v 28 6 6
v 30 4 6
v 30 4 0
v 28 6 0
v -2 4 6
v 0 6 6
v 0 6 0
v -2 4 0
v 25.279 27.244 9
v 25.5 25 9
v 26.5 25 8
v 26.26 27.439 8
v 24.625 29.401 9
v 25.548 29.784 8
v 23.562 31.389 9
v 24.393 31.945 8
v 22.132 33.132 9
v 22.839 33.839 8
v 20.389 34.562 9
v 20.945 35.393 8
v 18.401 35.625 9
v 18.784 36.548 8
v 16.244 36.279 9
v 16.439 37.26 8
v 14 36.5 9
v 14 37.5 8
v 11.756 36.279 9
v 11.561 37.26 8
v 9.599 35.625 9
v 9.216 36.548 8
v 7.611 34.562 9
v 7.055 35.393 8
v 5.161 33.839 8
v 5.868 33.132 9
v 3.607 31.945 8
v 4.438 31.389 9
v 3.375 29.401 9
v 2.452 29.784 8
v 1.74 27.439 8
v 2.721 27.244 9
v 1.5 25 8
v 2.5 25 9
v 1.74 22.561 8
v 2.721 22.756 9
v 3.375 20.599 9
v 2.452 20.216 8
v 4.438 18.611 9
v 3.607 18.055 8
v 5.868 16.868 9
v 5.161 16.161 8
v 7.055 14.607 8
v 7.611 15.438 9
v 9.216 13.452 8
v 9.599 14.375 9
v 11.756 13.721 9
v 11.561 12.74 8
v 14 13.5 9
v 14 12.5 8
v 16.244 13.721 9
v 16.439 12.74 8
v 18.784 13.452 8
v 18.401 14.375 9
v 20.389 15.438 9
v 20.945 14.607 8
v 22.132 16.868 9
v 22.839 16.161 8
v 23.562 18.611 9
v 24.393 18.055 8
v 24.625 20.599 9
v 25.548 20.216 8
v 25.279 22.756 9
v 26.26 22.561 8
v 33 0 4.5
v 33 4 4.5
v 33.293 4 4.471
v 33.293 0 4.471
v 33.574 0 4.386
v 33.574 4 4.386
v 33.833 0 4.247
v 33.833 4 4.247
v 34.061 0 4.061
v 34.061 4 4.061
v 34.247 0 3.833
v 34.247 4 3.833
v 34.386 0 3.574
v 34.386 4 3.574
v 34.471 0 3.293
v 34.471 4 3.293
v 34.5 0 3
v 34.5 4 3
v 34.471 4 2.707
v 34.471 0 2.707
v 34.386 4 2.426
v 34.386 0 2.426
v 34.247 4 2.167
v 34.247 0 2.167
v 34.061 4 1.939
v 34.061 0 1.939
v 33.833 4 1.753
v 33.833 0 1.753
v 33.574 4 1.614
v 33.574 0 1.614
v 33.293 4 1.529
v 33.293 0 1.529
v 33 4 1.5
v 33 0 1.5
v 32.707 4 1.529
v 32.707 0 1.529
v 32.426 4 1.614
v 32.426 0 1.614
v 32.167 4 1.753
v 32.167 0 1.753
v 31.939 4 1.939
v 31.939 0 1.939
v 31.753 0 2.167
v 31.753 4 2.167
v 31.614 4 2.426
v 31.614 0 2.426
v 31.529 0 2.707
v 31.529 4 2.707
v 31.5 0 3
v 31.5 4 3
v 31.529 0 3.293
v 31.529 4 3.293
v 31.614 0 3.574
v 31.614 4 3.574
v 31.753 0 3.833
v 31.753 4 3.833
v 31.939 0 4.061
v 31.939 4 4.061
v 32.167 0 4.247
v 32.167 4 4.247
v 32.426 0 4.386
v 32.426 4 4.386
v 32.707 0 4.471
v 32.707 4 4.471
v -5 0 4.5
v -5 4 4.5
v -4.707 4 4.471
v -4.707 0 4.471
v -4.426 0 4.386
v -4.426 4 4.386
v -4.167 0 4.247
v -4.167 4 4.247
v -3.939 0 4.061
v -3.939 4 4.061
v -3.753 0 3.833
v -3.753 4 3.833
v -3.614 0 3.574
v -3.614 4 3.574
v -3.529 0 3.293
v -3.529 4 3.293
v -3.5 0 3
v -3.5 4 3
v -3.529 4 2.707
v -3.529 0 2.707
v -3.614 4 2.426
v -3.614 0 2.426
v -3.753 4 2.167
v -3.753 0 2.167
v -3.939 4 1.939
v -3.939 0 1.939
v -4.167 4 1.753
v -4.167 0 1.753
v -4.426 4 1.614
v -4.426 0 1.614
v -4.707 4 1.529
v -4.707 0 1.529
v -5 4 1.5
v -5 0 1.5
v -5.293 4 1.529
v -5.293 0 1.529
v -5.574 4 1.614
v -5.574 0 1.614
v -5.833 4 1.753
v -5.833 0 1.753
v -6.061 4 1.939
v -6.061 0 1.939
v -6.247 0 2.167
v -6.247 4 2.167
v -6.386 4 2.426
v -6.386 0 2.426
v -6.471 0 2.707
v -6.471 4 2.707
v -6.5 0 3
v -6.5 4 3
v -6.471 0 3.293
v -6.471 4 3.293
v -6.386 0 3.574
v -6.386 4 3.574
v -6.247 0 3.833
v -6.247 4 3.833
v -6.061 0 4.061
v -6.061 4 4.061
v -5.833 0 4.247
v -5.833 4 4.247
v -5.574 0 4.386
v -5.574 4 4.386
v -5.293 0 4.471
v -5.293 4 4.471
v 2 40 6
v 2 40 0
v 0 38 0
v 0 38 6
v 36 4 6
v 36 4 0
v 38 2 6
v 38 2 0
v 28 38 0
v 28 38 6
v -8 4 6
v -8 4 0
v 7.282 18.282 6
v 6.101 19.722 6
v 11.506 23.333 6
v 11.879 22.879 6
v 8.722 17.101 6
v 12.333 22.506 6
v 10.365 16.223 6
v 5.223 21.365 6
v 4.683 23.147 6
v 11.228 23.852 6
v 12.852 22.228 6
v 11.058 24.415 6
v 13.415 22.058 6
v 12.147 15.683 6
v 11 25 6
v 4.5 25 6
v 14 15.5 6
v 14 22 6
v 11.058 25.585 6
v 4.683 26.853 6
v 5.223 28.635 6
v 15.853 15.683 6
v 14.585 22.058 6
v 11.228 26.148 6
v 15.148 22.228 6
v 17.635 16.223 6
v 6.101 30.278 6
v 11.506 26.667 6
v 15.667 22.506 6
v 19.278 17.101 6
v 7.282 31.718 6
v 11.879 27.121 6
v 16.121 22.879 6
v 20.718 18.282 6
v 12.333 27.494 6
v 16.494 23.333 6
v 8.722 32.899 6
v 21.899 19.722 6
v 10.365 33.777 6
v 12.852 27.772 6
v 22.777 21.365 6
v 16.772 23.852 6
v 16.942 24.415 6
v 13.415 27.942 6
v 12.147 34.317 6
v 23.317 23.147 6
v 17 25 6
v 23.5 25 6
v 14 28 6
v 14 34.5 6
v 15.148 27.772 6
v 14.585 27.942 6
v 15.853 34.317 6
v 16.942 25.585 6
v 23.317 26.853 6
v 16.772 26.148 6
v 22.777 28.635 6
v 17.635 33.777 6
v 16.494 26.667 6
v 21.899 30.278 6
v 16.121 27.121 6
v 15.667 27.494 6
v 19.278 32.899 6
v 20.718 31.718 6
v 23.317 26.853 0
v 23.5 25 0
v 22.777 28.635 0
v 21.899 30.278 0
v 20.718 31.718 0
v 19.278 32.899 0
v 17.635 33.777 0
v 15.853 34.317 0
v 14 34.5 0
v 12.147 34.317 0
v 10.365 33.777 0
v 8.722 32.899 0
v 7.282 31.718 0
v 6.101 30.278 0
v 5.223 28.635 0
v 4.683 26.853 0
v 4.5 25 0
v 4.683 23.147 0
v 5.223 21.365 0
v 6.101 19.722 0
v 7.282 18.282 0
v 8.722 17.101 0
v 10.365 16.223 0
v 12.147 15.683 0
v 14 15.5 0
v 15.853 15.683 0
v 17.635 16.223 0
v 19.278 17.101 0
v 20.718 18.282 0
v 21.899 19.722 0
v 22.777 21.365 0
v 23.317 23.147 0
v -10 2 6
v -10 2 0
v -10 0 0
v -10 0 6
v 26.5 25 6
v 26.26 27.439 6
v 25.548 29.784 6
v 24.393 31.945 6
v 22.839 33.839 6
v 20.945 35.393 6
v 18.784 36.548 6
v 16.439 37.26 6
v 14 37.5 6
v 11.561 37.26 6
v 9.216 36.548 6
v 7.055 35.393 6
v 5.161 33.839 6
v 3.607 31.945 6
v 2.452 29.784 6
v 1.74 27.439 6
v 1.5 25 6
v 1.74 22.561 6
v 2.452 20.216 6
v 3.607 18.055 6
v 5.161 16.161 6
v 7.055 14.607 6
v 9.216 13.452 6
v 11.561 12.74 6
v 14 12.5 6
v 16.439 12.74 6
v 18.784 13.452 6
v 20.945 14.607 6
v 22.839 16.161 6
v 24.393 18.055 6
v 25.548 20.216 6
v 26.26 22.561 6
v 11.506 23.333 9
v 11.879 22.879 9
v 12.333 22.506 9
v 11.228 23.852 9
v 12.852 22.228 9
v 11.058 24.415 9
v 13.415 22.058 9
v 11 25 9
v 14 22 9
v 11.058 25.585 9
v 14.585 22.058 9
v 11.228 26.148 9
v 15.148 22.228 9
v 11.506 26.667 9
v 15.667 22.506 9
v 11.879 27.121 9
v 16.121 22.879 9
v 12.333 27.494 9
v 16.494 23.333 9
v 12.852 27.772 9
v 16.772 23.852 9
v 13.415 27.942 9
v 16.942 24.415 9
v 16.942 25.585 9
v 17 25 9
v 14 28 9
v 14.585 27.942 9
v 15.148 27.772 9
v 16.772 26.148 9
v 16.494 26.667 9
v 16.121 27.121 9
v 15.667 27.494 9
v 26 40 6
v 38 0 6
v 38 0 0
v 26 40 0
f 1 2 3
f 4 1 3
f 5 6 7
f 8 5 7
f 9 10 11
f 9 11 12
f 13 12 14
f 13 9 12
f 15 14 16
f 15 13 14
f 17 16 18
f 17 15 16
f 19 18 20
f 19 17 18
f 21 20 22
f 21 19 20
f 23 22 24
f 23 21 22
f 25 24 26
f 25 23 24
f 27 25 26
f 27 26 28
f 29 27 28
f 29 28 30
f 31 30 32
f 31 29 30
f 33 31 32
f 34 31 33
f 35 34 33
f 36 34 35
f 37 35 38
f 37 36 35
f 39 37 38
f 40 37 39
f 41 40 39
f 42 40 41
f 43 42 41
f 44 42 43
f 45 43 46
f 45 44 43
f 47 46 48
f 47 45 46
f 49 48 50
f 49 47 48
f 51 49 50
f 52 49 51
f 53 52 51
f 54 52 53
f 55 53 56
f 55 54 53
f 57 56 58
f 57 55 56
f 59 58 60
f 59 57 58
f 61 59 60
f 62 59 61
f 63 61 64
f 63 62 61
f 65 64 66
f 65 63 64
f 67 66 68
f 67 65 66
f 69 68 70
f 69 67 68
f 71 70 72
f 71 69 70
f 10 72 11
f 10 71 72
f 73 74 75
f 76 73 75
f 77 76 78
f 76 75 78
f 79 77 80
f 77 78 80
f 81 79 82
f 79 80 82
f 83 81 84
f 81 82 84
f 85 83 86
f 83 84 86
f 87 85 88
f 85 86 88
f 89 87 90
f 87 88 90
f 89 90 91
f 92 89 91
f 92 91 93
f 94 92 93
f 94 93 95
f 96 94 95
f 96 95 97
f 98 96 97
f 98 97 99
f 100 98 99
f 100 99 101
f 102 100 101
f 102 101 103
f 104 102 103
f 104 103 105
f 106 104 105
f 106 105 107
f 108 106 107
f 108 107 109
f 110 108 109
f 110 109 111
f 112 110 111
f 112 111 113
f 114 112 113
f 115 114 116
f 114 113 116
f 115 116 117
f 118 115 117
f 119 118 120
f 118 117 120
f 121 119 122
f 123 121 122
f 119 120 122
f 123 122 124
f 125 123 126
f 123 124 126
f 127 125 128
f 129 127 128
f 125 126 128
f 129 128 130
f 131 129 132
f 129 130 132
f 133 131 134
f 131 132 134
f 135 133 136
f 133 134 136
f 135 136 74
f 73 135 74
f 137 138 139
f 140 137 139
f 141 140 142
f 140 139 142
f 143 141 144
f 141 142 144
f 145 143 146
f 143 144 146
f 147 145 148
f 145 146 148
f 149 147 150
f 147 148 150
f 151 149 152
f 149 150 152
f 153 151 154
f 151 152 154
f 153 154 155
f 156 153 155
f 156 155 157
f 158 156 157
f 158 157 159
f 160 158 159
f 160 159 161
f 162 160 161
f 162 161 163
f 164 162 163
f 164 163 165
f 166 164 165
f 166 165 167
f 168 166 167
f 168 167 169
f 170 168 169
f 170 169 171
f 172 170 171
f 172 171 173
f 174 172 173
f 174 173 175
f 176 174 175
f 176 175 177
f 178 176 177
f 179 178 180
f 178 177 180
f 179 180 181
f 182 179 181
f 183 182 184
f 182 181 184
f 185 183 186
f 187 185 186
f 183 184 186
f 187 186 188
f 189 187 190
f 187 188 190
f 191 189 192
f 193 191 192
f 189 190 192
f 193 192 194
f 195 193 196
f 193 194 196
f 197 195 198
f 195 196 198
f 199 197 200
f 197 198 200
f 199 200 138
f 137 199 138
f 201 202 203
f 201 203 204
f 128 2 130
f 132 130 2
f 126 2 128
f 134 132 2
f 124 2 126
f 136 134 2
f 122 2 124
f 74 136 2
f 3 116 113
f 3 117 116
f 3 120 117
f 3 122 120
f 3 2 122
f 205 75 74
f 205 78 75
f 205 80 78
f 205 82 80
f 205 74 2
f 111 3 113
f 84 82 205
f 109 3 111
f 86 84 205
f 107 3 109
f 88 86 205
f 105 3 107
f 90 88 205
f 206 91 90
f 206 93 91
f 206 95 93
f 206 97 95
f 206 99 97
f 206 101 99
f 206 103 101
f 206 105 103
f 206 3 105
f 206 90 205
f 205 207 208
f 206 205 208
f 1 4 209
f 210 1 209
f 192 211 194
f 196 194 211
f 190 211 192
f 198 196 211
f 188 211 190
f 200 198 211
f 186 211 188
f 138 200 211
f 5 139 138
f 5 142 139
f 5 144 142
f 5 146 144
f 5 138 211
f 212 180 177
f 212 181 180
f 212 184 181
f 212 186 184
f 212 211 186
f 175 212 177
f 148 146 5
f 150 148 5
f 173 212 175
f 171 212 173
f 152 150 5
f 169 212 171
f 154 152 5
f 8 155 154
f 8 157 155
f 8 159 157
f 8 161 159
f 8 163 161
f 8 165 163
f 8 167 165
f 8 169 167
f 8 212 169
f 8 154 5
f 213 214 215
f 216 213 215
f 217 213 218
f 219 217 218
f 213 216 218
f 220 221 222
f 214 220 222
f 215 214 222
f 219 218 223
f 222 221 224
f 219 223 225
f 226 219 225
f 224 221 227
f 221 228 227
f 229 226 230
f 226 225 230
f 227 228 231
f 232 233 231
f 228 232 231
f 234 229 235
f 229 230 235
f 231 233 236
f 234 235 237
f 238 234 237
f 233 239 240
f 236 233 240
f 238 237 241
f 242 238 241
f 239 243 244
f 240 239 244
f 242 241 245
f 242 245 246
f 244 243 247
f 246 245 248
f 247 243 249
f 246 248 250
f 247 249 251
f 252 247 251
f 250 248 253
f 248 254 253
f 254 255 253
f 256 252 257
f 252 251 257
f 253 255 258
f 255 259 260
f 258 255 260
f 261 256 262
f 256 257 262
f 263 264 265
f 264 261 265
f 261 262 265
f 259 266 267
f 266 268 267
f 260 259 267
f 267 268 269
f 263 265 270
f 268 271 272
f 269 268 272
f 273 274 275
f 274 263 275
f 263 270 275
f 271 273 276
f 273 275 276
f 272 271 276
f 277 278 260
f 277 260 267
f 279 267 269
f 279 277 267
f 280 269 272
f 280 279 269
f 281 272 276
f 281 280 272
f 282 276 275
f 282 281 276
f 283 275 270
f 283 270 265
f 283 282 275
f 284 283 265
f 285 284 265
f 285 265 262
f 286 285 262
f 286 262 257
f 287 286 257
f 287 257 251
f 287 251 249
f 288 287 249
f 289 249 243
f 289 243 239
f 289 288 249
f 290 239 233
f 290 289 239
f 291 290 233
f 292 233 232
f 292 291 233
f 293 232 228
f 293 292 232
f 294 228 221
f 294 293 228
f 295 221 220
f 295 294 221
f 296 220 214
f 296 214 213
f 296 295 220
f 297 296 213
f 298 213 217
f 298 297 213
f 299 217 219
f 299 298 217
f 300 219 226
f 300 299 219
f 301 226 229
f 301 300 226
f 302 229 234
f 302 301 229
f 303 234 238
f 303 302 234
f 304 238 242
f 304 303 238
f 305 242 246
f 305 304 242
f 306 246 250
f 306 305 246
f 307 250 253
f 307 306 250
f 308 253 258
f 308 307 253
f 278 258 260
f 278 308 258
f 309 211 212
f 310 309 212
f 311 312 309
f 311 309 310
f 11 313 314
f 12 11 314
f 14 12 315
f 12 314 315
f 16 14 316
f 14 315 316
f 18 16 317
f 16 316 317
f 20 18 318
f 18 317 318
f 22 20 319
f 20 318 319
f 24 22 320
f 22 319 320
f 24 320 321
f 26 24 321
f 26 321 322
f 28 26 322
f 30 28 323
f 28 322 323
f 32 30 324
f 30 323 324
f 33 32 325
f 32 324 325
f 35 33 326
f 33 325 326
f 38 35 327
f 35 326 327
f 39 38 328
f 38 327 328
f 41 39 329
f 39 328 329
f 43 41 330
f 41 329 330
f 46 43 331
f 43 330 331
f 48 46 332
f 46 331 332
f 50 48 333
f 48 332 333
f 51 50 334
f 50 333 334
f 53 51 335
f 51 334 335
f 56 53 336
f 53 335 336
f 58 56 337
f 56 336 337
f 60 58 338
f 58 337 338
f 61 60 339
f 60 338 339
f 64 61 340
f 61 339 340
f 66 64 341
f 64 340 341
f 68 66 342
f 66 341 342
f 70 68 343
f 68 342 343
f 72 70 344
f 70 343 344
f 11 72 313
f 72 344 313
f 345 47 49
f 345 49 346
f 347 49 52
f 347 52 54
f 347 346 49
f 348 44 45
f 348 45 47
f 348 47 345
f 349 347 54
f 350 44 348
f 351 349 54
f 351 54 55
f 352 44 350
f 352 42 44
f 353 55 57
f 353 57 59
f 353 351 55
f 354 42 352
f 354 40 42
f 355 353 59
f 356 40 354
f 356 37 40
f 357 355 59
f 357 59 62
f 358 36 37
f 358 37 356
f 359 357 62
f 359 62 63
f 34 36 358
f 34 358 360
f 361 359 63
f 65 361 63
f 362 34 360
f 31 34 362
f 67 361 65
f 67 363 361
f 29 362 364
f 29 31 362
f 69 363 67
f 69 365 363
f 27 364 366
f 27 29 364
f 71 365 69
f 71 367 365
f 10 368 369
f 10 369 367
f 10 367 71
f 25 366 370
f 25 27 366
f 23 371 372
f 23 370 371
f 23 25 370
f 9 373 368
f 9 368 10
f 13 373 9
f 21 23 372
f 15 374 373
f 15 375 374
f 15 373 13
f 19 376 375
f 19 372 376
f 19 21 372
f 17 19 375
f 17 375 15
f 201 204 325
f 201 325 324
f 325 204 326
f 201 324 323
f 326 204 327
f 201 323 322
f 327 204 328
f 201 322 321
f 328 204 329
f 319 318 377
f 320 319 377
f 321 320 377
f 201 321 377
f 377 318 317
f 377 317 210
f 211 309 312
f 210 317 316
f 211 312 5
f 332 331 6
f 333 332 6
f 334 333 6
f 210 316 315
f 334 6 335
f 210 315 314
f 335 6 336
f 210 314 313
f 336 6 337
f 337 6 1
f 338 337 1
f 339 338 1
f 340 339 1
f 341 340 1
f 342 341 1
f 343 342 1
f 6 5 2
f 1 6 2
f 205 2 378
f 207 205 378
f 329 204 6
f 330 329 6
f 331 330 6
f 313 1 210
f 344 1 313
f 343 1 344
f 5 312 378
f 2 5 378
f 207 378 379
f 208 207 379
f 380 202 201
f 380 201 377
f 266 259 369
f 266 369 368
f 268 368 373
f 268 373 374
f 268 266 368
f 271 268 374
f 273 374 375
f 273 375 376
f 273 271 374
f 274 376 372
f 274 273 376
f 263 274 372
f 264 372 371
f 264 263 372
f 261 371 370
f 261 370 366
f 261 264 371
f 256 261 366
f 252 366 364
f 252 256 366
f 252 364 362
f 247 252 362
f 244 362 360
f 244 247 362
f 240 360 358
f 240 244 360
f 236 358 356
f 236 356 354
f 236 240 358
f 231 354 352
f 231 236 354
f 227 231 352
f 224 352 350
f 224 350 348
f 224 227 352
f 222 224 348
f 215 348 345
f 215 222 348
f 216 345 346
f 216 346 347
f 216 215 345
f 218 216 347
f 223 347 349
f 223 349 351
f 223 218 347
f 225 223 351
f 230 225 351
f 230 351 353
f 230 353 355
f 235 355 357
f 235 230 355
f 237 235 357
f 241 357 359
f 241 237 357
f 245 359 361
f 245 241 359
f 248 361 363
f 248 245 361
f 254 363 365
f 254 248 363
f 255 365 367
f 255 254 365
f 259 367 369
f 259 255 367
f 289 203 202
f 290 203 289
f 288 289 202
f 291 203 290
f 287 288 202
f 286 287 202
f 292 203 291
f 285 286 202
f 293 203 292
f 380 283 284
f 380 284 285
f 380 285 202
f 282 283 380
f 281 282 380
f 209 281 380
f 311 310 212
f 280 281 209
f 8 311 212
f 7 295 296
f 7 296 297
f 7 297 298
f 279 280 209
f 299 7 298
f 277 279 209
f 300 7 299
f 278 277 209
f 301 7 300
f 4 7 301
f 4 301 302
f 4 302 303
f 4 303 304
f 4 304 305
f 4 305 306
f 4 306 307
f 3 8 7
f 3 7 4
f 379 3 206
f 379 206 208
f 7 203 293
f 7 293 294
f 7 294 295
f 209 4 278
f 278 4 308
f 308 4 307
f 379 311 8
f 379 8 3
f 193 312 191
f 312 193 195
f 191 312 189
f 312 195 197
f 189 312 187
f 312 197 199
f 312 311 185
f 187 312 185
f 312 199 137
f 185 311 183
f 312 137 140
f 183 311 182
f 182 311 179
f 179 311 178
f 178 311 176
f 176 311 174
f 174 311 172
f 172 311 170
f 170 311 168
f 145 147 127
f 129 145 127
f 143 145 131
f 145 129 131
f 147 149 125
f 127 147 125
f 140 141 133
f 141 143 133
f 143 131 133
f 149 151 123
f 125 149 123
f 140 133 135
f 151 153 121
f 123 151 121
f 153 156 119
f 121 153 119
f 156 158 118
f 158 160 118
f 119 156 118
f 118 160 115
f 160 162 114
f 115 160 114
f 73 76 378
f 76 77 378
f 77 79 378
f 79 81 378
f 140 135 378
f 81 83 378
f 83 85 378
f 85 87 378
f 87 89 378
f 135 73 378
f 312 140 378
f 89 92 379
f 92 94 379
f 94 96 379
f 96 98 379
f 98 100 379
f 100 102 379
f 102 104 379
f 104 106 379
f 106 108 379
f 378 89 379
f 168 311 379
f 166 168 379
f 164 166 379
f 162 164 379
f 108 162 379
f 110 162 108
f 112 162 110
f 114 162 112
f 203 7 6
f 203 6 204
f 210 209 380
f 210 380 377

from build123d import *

# Parameters (mm, degrees)
SKETCH1_W           = 28
SKETCH1_H           = 40
SKETCH1_R           = 9.5
BOSS_EXTRUDE1_DEPTH = 6
SKETCH2_W           = 10
SKETCH2_H           = 6
BOSS_EXTRUDE2_DEPTH = 4
CHAMFER1_SIZE       = 2
SKETCH3_R           = 1.5
CUT_EXTRUDE1_DEPTH  = 53.687759489
SKETCH4_R           = 12.5
SKETCH4_R_2         = 3
BOSS_EXTRUDE3_DEPTH = 3
CHAMFER2_SIZE       = 1


with BuildPart() as part:
    # Sketch1 → Boss-Extrude1 (new body)
    with BuildSketch(Plane.XY):
        with Locations((14, 20)):
            Rectangle(SKETCH1_W, SKETCH1_H)
        with Locations((14, 25)):
            Circle(SKETCH1_R, mode=Mode.SUBTRACT)
    extrude(amount=BOSS_EXTRUDE1_DEPTH)

    # Sketch2 → Boss-Extrude2 (add)
    with BuildSketch(Plane(origin=(0, 0, 0), x_dir=(1, 0, 0), z_dir=(0, 1, 0))):
        with Locations((-5, -3)):
            Rectangle(SKETCH2_W, SKETCH2_H)
        with Locations((33, -3)):
            Rectangle(SKETCH2_W, SKETCH2_H)
    extrude(amount=BOSS_EXTRUDE2_DEPTH)

    # Chamfer1
    chamfer1_edges = [part.edges().sort_by_distance(p)[0] for p in [
        (0, 4, 3),
        (-10, 4, 3),
        (28, 4, 3),
        (38, 4, 3),
        (0, 40, 3),
        (28, 40, 3),
    ]]
    chamfer(chamfer1_edges, length=CHAMFER1_SIZE)

    # Sketch3 → Cut-Extrude1 (cut, through all)
    with BuildSketch(Plane(origin=(0, 4, 0), x_dir=(1, 0, 0), z_dir=(0, 1, 0))):
        with Locations(Location((-5, -3, 0), (0, 0, 270))):
            Circle(SKETCH3_R)
        with Locations(Location((33, -3, 0), (0, 0, 270))):
            Circle(SKETCH3_R)
    extrude(amount=-CUT_EXTRUDE1_DEPTH, mode=Mode.SUBTRACT)

    # Sketch4 → Boss-Extrude3 (add)
    with BuildSketch(Plane.XY.offset(6)):
        with Locations((14, 25)):
            Circle(SKETCH4_R)
        with Locations((14, 25)):
            Circle(SKETCH4_R_2, mode=Mode.SUBTRACT)
    extrude(amount=BOSS_EXTRUDE3_DEPTH)

    # Chamfer2
    chamfer2_edges = [part.edges().sort_by_distance(p)[0] for p in [
        (1.5, 25, 9),
    ]]
    chamfer(chamfer2_edges, length=CHAMFER2_SIZE)


solid = part.part
